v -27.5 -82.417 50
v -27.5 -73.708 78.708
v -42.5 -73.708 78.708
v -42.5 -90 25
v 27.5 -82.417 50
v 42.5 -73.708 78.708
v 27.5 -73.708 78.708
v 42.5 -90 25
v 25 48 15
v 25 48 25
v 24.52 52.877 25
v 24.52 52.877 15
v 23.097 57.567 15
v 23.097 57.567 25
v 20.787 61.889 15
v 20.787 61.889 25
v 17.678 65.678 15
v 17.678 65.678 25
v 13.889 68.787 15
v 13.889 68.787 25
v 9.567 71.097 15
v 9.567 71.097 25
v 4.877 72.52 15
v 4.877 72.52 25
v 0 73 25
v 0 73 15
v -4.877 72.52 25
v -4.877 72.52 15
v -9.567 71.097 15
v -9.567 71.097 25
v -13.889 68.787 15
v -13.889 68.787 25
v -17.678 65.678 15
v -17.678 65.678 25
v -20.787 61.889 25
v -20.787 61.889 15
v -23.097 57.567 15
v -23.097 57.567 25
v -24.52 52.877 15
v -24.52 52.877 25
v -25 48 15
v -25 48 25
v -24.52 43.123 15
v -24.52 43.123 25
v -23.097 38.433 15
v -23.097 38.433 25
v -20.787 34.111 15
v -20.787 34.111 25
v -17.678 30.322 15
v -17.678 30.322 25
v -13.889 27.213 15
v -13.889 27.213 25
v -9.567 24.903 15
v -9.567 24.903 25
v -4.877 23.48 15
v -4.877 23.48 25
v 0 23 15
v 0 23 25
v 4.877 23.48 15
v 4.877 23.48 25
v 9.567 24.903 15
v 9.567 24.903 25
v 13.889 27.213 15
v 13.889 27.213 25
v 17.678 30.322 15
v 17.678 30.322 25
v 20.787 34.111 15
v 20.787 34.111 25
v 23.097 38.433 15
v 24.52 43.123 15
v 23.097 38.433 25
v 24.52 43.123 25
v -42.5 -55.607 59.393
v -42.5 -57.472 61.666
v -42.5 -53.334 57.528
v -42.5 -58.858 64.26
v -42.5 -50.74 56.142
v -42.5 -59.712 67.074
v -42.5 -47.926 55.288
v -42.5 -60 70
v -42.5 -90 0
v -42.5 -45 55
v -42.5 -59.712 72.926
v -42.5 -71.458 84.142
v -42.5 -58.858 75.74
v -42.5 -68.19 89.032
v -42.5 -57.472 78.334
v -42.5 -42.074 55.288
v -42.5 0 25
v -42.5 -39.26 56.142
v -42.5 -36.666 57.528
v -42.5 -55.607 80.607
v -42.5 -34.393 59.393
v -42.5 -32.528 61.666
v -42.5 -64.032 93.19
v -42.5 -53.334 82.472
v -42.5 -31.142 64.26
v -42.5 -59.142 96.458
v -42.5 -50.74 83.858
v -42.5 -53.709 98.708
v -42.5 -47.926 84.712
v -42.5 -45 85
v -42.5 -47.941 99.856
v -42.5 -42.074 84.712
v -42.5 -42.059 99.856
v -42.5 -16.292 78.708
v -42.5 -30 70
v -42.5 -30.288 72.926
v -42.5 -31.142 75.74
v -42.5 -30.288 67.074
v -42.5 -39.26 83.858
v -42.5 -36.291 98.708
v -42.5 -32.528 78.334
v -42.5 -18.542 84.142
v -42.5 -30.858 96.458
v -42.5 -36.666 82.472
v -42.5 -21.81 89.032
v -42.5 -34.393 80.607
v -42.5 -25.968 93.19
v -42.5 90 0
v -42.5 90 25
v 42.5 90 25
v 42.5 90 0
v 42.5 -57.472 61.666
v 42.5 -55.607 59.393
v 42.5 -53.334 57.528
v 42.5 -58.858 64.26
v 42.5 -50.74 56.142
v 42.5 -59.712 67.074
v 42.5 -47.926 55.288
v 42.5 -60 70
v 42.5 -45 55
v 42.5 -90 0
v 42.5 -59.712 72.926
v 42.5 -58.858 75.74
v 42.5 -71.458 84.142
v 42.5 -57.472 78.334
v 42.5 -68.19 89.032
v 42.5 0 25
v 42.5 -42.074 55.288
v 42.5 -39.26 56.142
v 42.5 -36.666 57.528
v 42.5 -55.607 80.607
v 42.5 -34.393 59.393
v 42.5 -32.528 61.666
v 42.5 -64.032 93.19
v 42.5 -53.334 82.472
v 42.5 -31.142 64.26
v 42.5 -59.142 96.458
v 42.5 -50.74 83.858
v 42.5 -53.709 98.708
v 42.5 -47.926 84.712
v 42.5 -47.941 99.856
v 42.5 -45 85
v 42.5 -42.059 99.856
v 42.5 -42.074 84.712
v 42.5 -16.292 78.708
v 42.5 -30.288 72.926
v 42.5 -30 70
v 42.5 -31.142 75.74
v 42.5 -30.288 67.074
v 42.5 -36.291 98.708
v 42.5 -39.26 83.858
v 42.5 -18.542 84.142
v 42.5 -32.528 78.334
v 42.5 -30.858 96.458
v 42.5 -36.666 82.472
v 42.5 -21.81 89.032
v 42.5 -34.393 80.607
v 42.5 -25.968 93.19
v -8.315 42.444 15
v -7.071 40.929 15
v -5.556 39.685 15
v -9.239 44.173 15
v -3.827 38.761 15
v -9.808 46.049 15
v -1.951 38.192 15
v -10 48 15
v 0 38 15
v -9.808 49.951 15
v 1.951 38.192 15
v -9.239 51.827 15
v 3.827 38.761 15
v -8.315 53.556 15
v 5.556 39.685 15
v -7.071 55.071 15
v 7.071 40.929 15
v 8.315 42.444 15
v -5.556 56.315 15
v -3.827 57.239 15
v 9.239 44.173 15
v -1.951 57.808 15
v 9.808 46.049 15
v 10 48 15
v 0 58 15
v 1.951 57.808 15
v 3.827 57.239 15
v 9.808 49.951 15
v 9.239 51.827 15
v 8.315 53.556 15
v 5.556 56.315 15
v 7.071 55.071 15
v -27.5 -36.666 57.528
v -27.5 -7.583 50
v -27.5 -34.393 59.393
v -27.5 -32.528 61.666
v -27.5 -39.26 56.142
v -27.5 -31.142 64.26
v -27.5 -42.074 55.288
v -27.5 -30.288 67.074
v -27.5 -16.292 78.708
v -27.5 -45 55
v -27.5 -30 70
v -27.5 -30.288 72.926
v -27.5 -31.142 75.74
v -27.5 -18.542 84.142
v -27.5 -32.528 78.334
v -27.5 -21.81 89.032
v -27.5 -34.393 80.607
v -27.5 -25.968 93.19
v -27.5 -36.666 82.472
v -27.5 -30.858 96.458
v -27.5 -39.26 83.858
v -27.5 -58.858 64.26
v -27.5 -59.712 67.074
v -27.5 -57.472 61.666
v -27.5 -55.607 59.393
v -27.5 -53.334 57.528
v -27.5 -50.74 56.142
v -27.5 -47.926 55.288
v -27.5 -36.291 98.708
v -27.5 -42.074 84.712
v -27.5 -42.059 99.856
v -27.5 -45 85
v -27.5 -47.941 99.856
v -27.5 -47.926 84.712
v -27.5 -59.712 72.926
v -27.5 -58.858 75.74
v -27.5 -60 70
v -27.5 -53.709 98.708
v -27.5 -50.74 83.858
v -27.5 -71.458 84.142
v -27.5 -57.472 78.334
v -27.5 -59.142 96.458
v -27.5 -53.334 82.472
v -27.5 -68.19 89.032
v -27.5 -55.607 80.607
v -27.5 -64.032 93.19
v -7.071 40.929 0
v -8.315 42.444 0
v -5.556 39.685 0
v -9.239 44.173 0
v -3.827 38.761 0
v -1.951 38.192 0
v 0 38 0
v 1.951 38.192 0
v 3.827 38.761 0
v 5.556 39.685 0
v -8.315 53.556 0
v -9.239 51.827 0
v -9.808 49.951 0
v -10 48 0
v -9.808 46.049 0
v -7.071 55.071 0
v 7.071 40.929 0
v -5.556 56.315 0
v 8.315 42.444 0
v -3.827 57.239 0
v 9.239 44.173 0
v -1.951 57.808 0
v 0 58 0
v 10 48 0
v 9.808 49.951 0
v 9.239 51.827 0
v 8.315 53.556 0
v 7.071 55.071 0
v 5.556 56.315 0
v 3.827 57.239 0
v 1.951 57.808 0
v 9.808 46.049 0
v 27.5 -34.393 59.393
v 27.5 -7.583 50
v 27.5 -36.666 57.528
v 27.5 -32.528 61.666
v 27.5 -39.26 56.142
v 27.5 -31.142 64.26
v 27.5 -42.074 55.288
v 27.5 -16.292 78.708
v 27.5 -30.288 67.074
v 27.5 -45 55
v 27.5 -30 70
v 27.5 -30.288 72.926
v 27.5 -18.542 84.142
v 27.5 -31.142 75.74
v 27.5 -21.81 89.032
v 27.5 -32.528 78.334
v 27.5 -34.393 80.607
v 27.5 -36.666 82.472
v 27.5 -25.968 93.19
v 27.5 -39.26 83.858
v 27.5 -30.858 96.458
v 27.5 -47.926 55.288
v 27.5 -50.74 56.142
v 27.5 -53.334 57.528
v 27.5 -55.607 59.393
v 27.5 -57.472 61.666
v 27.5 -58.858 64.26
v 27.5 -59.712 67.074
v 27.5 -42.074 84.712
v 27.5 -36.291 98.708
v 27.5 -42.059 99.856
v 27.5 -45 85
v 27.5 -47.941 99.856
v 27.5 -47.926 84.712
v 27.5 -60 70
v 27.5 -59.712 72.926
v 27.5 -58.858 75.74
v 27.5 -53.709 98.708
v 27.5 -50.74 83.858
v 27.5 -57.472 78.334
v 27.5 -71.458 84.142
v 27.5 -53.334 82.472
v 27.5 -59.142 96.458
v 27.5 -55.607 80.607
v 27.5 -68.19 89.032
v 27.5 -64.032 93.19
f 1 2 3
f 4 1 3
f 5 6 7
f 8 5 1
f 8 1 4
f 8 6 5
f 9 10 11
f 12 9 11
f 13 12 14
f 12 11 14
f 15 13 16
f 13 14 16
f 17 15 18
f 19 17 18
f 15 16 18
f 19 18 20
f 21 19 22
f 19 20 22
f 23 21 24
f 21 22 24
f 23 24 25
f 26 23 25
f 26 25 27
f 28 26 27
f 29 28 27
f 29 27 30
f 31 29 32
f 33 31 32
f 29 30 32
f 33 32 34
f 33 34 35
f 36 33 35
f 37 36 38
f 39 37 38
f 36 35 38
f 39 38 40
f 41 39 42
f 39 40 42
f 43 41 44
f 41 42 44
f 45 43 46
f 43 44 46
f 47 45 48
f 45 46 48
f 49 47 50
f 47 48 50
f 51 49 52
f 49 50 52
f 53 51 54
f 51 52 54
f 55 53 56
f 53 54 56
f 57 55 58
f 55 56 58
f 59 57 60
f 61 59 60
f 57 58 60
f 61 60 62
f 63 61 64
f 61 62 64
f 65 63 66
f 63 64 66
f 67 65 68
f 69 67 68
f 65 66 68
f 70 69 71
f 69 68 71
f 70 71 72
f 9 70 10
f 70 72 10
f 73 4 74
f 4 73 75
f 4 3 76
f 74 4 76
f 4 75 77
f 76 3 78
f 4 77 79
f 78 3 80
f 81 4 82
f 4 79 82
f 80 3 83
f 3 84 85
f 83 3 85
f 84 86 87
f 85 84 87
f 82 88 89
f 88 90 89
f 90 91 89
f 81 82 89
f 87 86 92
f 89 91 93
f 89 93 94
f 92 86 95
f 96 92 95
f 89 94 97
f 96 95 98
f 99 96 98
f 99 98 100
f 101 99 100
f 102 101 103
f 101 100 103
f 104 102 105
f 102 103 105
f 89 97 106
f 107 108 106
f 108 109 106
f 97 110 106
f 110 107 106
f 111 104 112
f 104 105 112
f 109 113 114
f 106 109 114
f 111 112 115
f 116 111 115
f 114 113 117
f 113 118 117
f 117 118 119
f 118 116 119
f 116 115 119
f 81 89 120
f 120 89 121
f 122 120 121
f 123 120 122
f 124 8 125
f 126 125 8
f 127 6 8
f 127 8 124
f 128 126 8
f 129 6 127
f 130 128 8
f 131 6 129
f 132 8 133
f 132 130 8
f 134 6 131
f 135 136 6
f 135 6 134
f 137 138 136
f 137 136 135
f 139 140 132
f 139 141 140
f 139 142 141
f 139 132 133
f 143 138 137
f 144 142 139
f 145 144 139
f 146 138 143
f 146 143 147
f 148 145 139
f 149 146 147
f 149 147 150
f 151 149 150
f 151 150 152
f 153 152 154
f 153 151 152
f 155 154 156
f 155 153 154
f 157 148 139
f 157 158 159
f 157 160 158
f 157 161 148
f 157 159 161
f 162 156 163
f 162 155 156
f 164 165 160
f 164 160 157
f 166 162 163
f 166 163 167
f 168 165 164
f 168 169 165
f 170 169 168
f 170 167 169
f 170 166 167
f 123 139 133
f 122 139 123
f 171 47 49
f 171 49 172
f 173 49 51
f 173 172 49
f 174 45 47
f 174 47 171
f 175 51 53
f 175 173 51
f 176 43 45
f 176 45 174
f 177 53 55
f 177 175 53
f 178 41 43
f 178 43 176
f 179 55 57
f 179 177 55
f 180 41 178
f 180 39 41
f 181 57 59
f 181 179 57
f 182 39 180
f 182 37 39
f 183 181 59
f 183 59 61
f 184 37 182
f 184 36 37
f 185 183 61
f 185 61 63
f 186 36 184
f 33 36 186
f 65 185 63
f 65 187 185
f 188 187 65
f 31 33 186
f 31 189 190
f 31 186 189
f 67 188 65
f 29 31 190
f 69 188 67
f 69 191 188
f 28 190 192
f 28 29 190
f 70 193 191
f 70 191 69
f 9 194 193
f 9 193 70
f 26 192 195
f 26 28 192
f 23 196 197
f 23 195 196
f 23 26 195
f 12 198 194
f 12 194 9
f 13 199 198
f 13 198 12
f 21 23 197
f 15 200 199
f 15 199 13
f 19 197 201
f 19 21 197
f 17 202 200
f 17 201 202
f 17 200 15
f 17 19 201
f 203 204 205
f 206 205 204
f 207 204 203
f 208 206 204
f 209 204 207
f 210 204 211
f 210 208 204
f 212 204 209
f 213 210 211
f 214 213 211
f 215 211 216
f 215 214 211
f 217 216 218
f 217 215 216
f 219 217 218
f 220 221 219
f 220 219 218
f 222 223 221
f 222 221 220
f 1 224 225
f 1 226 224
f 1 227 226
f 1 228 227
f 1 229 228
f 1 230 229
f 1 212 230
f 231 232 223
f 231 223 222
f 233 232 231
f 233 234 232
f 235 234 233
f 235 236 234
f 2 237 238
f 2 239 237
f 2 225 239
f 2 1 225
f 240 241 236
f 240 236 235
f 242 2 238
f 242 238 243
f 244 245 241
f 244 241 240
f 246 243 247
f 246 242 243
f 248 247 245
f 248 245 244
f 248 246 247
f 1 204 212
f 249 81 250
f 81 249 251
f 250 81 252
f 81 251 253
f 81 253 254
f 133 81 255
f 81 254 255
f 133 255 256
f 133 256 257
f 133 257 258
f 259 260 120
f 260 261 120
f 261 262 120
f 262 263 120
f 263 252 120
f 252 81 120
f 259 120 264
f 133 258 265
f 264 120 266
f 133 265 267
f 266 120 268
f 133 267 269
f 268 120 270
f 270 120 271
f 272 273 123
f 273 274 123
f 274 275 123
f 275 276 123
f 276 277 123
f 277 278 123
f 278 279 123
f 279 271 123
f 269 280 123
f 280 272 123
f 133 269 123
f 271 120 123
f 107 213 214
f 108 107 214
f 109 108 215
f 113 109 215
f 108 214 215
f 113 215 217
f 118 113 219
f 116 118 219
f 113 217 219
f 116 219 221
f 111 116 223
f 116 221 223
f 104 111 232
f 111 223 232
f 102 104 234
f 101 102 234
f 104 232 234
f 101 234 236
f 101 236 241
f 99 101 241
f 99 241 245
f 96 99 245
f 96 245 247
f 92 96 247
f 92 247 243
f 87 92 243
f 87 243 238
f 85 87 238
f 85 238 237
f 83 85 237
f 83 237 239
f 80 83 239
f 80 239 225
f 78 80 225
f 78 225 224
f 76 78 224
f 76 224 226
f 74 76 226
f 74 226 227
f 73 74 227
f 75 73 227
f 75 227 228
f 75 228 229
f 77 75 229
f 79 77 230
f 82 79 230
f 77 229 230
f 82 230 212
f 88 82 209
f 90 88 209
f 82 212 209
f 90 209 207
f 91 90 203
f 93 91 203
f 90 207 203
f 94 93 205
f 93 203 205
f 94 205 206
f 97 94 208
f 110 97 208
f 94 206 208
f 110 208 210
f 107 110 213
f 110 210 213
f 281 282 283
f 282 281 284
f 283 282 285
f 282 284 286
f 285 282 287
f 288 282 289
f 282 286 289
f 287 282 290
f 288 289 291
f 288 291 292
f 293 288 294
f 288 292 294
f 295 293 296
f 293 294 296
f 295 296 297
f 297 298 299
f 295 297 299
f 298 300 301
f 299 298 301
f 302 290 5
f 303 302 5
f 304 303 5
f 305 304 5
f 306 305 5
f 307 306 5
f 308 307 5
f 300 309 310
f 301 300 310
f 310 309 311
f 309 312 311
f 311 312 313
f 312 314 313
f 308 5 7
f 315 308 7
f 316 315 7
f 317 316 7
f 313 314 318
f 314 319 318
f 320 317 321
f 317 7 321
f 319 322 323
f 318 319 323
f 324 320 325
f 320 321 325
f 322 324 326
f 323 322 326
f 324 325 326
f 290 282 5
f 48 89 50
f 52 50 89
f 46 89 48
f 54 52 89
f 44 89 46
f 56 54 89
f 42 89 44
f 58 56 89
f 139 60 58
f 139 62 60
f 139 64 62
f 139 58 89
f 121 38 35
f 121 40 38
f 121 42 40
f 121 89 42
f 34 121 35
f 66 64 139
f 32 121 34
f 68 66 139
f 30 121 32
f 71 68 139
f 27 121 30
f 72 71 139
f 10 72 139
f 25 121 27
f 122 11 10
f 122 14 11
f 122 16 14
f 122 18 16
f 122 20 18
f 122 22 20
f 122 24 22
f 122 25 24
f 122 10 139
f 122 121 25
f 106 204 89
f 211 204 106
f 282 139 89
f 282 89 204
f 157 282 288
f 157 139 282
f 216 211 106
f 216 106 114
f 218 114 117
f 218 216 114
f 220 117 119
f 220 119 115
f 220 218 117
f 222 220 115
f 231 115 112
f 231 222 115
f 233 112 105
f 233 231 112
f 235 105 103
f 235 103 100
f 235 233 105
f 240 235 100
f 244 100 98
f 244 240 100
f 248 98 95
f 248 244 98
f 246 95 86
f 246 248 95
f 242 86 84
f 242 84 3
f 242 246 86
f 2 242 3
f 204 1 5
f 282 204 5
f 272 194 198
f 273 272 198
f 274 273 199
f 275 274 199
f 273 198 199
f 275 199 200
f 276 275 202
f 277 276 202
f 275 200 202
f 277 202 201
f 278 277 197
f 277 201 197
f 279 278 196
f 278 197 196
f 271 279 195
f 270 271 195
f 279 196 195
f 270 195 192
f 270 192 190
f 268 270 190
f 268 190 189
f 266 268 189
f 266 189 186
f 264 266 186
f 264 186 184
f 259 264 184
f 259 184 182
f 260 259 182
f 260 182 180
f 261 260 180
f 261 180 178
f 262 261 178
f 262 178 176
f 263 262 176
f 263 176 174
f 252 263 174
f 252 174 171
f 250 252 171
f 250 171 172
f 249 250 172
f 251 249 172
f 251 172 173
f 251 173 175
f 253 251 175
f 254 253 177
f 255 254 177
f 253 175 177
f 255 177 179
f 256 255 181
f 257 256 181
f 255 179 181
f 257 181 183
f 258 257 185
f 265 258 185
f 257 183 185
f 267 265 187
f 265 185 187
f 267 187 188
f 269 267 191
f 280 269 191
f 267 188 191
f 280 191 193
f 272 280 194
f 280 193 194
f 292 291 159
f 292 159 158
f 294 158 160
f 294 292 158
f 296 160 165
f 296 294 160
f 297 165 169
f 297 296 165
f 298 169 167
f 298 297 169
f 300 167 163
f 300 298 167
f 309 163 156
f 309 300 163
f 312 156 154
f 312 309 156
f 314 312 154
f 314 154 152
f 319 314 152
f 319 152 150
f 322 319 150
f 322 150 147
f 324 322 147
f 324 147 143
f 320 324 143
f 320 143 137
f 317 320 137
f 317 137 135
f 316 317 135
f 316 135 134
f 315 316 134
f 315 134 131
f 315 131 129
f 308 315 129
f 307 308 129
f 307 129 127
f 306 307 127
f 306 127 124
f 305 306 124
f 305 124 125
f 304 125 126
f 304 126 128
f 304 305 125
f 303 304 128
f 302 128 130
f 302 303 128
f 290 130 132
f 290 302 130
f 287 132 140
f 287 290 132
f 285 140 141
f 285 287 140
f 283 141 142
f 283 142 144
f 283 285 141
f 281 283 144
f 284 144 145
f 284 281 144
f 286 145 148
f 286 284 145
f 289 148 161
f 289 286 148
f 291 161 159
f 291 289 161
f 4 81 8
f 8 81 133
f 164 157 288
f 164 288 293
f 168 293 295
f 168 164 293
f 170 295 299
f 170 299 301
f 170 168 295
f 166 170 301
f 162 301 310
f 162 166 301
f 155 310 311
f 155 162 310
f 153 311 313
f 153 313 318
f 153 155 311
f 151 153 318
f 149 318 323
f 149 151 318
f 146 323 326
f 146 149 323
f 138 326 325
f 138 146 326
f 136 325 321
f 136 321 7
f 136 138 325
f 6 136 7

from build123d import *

# Parameters (mm, degrees)
F0_W          = 85
F0_H          = 180
F1_DEPTH      = 25
F2_R          = 15
F3_DEPTH      = 42.5
F3_DEPTH_BACK = 42.5
F4_W          = 55
F4_H          = 65
F5_DEPTH      = 180.001
F6_R          = 25
F7_DEPTH      = 10
F8_R          = 10
F9_DEPTH      = 15.001


with BuildPart() as f1:
    # F0 (on Top) → F1 (new body)
    with BuildSketch(Plane.XY):
        Rectangle(F0_W, F0_H)
    extrude(amount=F1_DEPTH)

    # F2 (on Right) → F3 (join, two sides)
    with BuildSketch(Plane.YZ) as f3_sk:
        with BuildLine():
            Line((0, 25), (-16.291713, 78.708287))
            ThreePointArc((-16.291713, 78.708287), (-45, 100), (-73.708287, 78.708287))
            Line((-73.708287, 78.708287), (-90, 25))
            Line((-90, 25), (0, 25))
        make_face()
        with Locations((-45, 70)):
            Circle(F2_R, mode=Mode.SUBTRACT)
    extrude(amount=F3_DEPTH)
    extrude(f3_sk.sketch, amount=-F3_DEPTH_BACK)

    # F4 (on face) → F5 (cut, through all)
    with BuildSketch(Plane.XZ.offset(90)):
        with Locations((0, 82.5)):
            Rectangle(F4_W, F4_H)
    extrude(amount=-F5_DEPTH, mode=Mode.SUBTRACT)

    # F6 (on face) → F7 (cut)
    with BuildSketch(Plane.XY.offset(25)):
        with Locations((0, 48)):
            Circle(F6_R)
    extrude(amount=-F7_DEPTH, mode=Mode.SUBTRACT)

    # F8 (on face) → F9 (cut, through all)
    with BuildSketch(Plane.XY.offset(15)):
        with Locations((0, 48)):
            Circle(F8_R)
    extrude(amount=-F9_DEPTH, mode=Mode.SUBTRACT)


solid = f1.part
